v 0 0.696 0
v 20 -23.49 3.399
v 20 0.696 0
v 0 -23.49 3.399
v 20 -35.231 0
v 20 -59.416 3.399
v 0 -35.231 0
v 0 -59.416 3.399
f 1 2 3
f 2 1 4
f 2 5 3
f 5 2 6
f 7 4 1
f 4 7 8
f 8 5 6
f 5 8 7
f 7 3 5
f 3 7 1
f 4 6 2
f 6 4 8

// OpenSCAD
angle = 82;
thickness = 5;
width = 20;
length = 60;

difference(){
translate([0, 0, -thickness * sin(angle)])
rotate([angle, 0, 0])
cube(size=[width, thickness, length], center=false);
translate([-1, -length, -thickness])
    cube(size=[width + 2, length + thickness, thickness], center=false);
translate([-1, -length, length * cos(angle) - thickness * sin(angle)])
    cube(size=[width + 2, length + thickness, thickness], center=false);
}
